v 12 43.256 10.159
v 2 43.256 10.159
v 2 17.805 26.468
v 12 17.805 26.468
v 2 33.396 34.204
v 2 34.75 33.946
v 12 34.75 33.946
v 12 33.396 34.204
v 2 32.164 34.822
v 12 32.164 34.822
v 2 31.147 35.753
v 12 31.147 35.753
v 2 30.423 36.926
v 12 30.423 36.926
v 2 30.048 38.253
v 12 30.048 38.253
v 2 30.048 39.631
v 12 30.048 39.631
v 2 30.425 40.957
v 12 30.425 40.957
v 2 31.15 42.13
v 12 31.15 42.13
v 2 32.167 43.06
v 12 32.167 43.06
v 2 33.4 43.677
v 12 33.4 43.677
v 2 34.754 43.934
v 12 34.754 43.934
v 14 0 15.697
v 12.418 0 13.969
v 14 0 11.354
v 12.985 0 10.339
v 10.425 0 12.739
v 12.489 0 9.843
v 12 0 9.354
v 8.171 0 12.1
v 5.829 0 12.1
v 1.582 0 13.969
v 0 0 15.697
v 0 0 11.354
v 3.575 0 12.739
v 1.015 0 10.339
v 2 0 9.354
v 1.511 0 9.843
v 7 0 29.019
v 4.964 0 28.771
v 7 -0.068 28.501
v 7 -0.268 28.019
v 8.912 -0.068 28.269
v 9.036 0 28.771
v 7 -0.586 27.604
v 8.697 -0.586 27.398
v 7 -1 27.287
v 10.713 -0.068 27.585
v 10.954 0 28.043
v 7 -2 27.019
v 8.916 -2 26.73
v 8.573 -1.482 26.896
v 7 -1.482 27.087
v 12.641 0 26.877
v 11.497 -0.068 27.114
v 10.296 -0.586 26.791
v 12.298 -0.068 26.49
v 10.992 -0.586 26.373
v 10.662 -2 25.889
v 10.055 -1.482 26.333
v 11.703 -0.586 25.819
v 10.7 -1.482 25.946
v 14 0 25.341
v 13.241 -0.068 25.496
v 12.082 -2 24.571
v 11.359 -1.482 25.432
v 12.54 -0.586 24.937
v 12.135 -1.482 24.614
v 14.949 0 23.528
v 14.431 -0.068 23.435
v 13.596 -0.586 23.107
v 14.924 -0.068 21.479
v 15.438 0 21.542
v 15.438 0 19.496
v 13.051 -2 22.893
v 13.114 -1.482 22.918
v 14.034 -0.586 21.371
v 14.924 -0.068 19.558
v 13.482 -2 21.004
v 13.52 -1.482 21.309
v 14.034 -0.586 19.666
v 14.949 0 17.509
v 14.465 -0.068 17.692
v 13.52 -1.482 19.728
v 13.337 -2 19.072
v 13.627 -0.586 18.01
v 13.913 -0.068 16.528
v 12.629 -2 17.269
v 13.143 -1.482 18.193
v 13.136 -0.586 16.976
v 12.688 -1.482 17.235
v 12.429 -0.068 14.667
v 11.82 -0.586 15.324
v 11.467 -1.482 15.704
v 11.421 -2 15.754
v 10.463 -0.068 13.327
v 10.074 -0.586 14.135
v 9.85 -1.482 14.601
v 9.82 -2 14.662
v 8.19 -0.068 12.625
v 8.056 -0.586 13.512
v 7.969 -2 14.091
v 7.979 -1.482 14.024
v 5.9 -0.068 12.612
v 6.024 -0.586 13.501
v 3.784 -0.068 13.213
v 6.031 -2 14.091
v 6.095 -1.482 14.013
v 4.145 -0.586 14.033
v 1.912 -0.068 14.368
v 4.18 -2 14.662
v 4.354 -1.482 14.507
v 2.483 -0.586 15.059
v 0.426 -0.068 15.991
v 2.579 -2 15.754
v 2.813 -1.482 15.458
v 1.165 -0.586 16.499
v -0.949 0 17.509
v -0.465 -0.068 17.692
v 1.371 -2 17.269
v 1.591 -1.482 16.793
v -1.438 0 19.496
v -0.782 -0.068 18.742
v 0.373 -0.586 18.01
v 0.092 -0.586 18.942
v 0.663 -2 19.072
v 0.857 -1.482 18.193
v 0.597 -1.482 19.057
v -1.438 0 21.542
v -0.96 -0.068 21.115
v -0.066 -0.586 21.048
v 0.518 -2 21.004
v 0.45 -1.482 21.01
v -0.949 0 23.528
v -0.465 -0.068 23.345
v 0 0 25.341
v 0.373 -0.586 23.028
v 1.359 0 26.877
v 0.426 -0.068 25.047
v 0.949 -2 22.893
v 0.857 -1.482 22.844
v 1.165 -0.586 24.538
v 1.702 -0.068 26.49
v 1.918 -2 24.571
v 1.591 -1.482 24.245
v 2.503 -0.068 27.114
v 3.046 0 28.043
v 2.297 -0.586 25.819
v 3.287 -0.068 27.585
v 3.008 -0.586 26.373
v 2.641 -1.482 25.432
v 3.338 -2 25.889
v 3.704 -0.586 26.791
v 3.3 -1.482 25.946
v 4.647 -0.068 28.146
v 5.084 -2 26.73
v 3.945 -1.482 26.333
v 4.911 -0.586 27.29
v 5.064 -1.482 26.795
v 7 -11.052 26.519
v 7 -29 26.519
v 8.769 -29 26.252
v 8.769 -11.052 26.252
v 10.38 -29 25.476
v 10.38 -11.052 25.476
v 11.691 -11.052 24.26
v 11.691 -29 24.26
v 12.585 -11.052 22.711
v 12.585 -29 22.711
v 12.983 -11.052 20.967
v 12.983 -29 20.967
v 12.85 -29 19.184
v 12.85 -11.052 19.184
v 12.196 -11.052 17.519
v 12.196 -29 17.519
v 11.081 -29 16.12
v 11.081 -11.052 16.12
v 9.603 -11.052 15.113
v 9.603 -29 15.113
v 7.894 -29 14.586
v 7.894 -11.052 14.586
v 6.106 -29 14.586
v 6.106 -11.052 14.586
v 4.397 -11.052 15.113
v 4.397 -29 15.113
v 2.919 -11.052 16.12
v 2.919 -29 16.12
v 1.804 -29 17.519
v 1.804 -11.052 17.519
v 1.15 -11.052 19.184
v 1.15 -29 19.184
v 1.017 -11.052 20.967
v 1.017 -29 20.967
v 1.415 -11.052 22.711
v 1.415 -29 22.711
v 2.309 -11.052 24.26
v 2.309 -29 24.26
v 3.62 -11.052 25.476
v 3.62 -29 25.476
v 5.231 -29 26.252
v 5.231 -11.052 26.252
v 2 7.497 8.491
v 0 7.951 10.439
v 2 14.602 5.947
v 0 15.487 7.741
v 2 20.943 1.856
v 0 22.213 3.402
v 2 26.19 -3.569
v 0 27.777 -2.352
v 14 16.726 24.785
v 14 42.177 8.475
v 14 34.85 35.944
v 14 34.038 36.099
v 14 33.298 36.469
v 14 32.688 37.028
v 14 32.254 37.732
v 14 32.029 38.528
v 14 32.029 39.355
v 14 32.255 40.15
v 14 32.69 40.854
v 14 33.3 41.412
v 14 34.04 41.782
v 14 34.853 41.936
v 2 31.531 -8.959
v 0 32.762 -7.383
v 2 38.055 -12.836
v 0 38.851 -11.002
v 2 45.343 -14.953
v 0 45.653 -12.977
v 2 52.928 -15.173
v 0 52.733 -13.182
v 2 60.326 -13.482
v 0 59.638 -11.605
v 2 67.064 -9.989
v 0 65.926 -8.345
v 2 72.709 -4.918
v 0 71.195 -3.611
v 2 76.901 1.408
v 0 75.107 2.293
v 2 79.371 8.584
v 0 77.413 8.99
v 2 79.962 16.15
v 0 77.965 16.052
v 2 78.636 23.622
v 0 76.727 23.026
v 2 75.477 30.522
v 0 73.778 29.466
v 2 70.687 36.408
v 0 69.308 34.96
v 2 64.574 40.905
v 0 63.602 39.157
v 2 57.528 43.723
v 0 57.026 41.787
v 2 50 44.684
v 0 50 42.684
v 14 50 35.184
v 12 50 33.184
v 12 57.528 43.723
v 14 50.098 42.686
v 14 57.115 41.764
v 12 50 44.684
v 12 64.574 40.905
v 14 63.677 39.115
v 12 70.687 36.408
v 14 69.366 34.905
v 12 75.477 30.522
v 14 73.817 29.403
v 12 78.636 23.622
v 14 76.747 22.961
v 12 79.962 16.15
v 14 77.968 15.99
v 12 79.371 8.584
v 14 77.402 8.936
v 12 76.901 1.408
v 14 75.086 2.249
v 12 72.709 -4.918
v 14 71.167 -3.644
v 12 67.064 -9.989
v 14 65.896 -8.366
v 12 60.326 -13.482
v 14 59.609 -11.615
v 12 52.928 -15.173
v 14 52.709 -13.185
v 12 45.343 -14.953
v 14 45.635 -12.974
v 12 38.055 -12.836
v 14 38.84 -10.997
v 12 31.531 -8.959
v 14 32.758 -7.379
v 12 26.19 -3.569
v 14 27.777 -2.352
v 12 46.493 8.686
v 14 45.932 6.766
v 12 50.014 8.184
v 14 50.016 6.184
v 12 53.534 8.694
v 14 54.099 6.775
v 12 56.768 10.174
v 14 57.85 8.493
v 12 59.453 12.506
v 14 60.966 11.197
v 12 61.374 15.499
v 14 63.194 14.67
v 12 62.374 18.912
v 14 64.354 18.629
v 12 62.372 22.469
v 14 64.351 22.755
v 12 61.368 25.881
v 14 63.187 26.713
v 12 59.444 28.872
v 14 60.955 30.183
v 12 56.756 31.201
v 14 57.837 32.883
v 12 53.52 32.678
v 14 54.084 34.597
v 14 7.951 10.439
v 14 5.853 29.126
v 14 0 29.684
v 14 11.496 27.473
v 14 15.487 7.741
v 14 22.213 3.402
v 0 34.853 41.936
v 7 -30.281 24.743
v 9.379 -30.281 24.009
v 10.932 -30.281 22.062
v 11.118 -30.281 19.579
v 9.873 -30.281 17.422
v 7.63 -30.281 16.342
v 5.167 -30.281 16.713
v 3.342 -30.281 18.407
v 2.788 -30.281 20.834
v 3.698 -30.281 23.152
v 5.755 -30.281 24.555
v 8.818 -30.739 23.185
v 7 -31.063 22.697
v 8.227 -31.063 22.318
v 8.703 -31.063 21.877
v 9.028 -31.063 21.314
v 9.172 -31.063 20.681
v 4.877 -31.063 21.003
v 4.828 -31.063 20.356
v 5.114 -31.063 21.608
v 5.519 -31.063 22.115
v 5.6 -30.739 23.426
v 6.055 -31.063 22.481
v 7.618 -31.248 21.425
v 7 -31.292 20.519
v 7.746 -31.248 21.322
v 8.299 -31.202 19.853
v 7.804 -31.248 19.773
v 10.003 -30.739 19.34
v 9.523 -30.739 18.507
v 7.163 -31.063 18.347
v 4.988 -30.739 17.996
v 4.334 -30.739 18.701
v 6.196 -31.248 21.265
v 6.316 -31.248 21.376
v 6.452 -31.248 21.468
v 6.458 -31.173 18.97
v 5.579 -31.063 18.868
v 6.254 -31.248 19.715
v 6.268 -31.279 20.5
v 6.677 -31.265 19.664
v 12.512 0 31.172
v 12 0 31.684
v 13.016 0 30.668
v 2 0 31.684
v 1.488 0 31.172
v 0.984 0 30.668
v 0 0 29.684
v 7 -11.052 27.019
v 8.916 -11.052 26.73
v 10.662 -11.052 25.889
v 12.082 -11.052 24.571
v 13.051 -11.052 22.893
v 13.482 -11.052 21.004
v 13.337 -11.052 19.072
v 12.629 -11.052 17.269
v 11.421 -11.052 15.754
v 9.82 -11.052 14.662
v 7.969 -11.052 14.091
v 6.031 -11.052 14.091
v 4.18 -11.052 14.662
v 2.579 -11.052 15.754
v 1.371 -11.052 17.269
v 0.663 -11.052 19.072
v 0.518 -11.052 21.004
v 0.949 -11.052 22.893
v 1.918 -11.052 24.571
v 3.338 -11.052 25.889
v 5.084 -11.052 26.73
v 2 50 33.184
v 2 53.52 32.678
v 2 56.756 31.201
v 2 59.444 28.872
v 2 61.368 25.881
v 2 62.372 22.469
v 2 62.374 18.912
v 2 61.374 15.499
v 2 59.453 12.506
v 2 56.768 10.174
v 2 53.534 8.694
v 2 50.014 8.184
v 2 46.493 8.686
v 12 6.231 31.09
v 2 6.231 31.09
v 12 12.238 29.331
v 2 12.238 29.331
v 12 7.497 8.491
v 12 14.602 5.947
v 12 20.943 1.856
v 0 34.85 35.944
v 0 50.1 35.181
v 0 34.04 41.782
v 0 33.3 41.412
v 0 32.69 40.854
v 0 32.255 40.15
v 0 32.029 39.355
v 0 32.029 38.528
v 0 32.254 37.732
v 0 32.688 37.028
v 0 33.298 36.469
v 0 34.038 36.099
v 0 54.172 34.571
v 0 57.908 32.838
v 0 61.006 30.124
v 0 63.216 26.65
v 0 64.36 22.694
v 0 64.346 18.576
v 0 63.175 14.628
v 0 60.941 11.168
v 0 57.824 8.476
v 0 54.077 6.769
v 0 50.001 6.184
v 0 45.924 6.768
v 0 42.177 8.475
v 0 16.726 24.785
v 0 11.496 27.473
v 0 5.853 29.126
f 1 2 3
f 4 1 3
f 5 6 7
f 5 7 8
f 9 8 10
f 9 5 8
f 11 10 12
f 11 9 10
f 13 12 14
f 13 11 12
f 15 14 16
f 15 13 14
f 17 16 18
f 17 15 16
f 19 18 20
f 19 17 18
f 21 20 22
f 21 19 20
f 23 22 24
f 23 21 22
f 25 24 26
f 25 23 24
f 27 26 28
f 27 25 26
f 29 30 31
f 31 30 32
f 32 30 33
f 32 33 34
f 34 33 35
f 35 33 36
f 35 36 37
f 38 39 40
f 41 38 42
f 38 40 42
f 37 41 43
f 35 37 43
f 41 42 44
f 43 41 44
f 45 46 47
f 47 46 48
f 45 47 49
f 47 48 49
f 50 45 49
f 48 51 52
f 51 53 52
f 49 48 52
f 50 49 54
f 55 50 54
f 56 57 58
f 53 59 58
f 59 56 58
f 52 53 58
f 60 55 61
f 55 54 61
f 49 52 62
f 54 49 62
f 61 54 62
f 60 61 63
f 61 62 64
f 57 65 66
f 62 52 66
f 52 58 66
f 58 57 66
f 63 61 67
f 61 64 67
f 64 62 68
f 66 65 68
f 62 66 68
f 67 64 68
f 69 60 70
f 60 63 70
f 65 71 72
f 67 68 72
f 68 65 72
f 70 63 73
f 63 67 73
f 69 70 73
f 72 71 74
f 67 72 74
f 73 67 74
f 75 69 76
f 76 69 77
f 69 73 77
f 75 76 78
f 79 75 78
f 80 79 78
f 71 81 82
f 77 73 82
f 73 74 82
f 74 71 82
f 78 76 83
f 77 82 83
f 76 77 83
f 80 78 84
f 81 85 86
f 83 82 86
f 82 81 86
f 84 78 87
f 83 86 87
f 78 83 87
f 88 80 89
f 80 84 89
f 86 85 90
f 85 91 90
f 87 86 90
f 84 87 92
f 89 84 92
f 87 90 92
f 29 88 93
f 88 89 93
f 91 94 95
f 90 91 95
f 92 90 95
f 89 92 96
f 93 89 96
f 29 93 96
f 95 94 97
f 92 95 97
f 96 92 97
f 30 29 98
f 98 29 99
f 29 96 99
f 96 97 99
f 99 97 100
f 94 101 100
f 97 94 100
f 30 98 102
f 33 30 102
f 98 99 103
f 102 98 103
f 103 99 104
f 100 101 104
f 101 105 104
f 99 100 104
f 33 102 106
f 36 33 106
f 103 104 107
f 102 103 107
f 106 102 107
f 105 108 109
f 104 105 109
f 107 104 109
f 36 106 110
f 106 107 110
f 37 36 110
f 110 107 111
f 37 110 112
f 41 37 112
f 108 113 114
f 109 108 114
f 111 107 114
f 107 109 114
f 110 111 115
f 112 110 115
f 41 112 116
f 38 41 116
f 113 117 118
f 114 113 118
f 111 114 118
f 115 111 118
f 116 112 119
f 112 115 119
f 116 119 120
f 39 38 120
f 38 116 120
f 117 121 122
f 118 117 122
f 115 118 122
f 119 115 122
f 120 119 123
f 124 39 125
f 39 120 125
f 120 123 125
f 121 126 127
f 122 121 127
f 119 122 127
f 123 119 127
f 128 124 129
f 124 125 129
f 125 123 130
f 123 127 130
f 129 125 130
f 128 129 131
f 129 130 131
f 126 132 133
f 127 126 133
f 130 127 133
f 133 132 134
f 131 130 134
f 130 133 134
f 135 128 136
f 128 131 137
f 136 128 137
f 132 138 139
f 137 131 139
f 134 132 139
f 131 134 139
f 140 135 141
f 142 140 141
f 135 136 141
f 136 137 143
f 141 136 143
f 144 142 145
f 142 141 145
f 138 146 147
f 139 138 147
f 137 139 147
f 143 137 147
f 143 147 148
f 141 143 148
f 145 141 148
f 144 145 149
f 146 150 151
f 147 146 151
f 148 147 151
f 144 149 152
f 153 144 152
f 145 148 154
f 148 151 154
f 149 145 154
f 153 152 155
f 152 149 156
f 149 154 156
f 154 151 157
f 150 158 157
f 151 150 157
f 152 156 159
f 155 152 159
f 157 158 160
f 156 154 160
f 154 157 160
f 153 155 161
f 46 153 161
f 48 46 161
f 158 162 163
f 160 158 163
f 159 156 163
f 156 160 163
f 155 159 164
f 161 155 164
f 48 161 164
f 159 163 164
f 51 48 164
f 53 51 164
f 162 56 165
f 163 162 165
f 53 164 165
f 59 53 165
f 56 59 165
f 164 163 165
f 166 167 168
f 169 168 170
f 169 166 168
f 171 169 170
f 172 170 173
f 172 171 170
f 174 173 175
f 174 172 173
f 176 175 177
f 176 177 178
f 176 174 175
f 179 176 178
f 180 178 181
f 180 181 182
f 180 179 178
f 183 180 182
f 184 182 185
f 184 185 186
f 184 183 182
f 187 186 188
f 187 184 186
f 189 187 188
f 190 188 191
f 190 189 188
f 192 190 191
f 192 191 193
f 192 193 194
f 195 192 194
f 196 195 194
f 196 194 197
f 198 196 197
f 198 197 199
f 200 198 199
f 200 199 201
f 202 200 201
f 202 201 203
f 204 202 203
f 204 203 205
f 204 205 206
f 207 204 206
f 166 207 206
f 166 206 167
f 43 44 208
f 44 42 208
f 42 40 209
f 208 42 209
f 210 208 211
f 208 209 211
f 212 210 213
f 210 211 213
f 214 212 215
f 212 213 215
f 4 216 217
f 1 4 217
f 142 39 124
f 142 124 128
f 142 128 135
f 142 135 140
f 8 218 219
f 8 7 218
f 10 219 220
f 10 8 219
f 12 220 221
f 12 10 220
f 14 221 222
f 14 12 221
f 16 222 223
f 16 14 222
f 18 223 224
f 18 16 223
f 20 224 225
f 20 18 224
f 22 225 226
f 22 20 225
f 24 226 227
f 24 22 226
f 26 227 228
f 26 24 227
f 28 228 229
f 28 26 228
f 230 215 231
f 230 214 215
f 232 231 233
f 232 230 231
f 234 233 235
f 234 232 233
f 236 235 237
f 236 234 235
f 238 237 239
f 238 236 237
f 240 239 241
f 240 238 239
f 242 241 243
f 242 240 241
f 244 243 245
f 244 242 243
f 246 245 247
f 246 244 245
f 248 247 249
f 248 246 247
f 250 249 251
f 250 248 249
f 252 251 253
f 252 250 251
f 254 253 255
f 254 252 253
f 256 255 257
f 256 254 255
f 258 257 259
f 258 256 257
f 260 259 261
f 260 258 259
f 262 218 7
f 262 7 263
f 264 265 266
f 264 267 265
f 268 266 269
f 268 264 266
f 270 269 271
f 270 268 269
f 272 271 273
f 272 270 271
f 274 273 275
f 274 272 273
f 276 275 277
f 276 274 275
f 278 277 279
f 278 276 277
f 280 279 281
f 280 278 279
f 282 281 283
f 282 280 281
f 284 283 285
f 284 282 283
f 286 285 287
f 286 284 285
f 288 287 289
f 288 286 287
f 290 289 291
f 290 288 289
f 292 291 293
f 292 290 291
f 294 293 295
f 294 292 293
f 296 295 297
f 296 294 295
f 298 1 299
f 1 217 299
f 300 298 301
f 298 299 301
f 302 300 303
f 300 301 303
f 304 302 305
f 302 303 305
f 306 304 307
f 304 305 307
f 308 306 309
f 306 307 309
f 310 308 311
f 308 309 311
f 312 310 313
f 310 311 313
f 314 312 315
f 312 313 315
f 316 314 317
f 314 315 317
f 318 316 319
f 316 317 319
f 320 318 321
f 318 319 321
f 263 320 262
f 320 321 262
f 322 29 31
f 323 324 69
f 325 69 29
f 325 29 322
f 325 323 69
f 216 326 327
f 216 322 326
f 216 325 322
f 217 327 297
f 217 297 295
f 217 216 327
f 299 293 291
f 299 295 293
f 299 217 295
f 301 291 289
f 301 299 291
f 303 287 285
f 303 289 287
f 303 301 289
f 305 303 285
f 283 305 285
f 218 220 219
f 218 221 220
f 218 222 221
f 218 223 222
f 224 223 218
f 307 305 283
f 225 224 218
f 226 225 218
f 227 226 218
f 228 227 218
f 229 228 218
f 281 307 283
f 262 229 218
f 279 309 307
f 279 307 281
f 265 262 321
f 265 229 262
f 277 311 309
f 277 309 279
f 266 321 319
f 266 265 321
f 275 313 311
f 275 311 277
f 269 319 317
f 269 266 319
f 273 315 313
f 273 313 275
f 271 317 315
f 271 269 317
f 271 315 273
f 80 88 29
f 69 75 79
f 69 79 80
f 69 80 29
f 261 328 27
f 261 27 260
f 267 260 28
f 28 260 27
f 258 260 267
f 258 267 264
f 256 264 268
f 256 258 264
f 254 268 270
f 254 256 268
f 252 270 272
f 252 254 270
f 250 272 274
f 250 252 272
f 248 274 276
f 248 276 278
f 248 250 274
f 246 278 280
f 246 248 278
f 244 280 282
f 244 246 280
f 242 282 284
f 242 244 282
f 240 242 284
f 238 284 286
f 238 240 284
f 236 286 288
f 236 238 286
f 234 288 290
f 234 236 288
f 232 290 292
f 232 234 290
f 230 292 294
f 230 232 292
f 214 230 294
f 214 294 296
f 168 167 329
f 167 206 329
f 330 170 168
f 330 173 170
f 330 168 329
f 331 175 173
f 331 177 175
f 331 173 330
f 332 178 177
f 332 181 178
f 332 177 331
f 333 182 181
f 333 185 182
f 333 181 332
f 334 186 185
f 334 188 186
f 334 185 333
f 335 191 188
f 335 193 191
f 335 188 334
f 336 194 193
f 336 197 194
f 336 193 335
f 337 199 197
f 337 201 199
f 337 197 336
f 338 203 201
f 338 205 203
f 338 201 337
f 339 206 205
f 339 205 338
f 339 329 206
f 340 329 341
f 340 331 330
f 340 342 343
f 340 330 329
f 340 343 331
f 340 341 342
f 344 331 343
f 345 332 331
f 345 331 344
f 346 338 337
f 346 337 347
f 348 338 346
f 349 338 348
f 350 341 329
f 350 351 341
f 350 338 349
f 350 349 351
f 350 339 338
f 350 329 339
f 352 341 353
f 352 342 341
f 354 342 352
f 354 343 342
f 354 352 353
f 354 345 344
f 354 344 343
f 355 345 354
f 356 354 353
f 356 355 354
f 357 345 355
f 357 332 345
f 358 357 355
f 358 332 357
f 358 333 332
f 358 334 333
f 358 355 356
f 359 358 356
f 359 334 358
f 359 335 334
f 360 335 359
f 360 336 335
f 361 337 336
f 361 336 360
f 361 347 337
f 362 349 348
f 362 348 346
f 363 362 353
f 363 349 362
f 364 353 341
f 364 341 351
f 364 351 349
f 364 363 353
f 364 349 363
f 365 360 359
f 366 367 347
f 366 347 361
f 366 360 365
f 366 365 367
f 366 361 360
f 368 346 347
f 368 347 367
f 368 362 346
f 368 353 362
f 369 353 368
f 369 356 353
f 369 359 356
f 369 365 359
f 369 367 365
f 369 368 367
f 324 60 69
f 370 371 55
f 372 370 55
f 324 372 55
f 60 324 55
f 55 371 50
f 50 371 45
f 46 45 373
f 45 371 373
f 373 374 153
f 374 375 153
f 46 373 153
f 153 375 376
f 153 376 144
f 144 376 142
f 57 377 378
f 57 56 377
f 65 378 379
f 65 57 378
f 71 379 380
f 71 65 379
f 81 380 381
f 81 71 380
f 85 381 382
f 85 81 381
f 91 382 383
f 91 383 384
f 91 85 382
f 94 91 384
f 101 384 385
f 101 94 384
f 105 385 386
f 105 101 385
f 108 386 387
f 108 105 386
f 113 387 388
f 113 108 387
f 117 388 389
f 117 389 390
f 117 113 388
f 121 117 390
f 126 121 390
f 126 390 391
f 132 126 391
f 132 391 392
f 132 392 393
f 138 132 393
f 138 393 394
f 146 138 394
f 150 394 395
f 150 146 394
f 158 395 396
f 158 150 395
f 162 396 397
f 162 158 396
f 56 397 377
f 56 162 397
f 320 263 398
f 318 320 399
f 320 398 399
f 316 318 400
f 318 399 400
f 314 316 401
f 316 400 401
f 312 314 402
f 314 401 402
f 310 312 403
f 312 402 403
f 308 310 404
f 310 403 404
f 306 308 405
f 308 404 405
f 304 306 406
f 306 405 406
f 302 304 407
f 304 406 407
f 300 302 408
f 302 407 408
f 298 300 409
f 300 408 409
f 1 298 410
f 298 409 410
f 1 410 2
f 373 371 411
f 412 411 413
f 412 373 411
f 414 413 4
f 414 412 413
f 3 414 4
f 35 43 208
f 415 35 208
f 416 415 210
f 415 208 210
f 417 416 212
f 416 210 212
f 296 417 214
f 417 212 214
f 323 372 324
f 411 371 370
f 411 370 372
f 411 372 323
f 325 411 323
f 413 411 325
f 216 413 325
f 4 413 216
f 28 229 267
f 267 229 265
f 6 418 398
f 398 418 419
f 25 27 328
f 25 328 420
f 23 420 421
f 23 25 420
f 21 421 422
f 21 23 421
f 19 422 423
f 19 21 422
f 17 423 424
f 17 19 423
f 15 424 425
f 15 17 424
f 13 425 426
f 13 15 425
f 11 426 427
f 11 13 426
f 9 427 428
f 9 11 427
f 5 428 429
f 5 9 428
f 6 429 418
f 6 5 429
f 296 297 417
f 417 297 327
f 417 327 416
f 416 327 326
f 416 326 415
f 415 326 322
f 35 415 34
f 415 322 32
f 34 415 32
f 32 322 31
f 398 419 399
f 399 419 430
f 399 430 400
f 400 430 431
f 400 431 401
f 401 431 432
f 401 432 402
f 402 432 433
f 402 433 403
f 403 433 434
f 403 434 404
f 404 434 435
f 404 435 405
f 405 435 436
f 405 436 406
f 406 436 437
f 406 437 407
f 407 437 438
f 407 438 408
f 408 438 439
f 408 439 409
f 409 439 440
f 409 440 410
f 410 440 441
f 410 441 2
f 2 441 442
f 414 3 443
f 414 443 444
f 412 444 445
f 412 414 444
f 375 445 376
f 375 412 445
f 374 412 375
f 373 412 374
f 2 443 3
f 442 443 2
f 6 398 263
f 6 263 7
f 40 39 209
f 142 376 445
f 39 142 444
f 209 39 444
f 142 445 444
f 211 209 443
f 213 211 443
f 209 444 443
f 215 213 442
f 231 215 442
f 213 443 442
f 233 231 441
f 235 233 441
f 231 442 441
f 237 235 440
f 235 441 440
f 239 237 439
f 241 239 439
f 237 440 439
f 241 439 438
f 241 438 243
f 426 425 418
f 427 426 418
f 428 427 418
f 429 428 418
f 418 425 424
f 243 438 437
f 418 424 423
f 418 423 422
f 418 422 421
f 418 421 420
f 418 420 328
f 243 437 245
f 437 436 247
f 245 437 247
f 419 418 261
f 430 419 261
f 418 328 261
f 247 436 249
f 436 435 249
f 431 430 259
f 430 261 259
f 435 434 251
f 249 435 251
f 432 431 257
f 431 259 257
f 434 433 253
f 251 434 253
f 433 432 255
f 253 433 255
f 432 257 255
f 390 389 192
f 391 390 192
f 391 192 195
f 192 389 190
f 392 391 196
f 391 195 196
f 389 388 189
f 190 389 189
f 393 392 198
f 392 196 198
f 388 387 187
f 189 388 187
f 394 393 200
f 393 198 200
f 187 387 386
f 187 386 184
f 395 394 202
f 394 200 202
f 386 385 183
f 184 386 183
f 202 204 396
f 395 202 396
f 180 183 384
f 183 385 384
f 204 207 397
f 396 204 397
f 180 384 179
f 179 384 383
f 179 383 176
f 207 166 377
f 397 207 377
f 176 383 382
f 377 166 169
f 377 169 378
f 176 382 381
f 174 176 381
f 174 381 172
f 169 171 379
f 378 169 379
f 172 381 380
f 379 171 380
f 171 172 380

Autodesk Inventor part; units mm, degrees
ref_plane "YZ Plane" through (0, 0, 0) normal (1, 0, 0) x (0, 1, 0)
ref_plane "XZ Plane" through (0, 0, 0) normal (0, 1, 0) x (-1, 0, 0)
sketch "Sketch1" plane through (0, 0, 0) normal (1, 0, 0) x (0, 1, 0)
  arc A0 (26.1895, -3.5687) -> (0, 9.3537) centre (0, -23.6463) ccw
  arc A1 (17.8047, 26.4685) -> (0, 31.6837) centre (0, -1.3163) ccw
  line L0 (91.8773, 20.6837) -> (-78.3169, 20.6837)
  arc A2 (43.2558, 10.1592) -> (50, 33.1837) centre (50, 20.6837) ccw
  arc A3 (26.1895, -3.5687) -> (50, 44.6837) centre (49.9981, 14.6837) ccw
  line L1 (43.2558, 10.1592) -> (17.8047, 26.4685)
  line L2 (0, 54.8963) -> (0, -73.9166)
  line L3 (50, 20.6837) -> (50, 74.3533) construction
  line L4 (50, 44.6837) -> (50, 33.1837)
  arc A4 (34.7544, 43.9339) -> (34.7503, 33.9462) centre (35, 38.94) ccw
  line L5 (50, 44.6837) -> (34.7544, 43.9339)
  line L6 (50, 33.1837) -> (34.7503, 33.9462)
  point P0 (0, 0)
  point P1 (0, 20.6837)
  dimension "d0" = 66
  dimension "d1" = 66
  dimension "d2" = 22.33
  dimension "d3" = 22
  dimension "d4" = 25
  dimension "d5" = 50
  dimension "d6" = 60
  dimension "d7" = 6
  dimension "d8" = 10
  dimension "d9" = 15
extrude "Extrusion1" add sketch "Sketch1" along normal blind 14 contours A0 L2 L0 L1 A2 A3 | L0 A2 L4 A3 | L2 A1 L1 L0 | L4 L6 A4 L5
chamfer "Chamfer1" distance 2 angle 45 16 edges at (14, 76.901, 1.4083) (14, 14.602, 5.9473) (0, 76.901, 1.4083) (0, 14.602, 5.9473) (14, 42.3752, 33.565) (14, 30, 38.942) (14, 42.3772, 44.3088) (14, 61.996, 17.1699) (14, 30.5303, 18.3138) (14, 9.2764, 30.3531) (0, 42.3772, 44.3088) (0, 30, 38.942) (0, 42.3752, 33.565) (0, 30.5303, 18.3138) (0, 9.2764, 30.3531) (0, 61.996, 17.1699)
ref_plane "Work Plane1" through (7, 0, 0) normal (-1, 0, 0) x (0, 0, 1)
sketch "Sketch2" plane through (7, 0, 0) normal (-1, 0, 0) x (0, 0, 1)
  line L0 (29.6837, 0) -> (11.3537, 0) projected
  line L1 (26.5187, 0) -> (14.5187, 0)
  line L2 (26.5187, -29) -> (26.5187, -11.0524)
  line L3 (27.0187, -11.0524) -> (27.0187, -2)
  line L4 (29.0187, 0) -> (30.2528, 0)
  line L5 (12.0186, 0) -> (11.3537, 0)
  arc A0 (29.0187, 0) -> (27.0187, -2) centre (29.0187, -2) ccw
  line L6 (20.5187, -31.2918) -> (20.5187, 0)
  line L7 (29.0187, 0) -> (12.0186, 0)
  line L8 (27.0187, -11.0524) -> (26.5187, -11.0524)
  arc A1 (20.5187, -31.2918) -> (26.5187, -29) centre (20.7329, -22.8528) ccw
  line L9 (29.0187, 0) -> (20.5187, 0)
  point P0 (0, 0)
  point P1 (27.0187, 0)
  dimension "d19" = 0.5
  dimension "d20" = 2
  dimension "d21" = 6
  dimension "d22" = 31.2918
revolve "Revolution1" add sketch "Sketch2" angle 360 about axis through (7, -31.2918, 20.5187) along (0, 1, 0)
thread "Thread1" size "M12x1.75" class "6g" standard "ISO Metric profile" length 13
thread "Thread2" size "M12x1.75" class "6g" standard "ANSI Metric M Profile" length 13
properties part number "Gancho"
